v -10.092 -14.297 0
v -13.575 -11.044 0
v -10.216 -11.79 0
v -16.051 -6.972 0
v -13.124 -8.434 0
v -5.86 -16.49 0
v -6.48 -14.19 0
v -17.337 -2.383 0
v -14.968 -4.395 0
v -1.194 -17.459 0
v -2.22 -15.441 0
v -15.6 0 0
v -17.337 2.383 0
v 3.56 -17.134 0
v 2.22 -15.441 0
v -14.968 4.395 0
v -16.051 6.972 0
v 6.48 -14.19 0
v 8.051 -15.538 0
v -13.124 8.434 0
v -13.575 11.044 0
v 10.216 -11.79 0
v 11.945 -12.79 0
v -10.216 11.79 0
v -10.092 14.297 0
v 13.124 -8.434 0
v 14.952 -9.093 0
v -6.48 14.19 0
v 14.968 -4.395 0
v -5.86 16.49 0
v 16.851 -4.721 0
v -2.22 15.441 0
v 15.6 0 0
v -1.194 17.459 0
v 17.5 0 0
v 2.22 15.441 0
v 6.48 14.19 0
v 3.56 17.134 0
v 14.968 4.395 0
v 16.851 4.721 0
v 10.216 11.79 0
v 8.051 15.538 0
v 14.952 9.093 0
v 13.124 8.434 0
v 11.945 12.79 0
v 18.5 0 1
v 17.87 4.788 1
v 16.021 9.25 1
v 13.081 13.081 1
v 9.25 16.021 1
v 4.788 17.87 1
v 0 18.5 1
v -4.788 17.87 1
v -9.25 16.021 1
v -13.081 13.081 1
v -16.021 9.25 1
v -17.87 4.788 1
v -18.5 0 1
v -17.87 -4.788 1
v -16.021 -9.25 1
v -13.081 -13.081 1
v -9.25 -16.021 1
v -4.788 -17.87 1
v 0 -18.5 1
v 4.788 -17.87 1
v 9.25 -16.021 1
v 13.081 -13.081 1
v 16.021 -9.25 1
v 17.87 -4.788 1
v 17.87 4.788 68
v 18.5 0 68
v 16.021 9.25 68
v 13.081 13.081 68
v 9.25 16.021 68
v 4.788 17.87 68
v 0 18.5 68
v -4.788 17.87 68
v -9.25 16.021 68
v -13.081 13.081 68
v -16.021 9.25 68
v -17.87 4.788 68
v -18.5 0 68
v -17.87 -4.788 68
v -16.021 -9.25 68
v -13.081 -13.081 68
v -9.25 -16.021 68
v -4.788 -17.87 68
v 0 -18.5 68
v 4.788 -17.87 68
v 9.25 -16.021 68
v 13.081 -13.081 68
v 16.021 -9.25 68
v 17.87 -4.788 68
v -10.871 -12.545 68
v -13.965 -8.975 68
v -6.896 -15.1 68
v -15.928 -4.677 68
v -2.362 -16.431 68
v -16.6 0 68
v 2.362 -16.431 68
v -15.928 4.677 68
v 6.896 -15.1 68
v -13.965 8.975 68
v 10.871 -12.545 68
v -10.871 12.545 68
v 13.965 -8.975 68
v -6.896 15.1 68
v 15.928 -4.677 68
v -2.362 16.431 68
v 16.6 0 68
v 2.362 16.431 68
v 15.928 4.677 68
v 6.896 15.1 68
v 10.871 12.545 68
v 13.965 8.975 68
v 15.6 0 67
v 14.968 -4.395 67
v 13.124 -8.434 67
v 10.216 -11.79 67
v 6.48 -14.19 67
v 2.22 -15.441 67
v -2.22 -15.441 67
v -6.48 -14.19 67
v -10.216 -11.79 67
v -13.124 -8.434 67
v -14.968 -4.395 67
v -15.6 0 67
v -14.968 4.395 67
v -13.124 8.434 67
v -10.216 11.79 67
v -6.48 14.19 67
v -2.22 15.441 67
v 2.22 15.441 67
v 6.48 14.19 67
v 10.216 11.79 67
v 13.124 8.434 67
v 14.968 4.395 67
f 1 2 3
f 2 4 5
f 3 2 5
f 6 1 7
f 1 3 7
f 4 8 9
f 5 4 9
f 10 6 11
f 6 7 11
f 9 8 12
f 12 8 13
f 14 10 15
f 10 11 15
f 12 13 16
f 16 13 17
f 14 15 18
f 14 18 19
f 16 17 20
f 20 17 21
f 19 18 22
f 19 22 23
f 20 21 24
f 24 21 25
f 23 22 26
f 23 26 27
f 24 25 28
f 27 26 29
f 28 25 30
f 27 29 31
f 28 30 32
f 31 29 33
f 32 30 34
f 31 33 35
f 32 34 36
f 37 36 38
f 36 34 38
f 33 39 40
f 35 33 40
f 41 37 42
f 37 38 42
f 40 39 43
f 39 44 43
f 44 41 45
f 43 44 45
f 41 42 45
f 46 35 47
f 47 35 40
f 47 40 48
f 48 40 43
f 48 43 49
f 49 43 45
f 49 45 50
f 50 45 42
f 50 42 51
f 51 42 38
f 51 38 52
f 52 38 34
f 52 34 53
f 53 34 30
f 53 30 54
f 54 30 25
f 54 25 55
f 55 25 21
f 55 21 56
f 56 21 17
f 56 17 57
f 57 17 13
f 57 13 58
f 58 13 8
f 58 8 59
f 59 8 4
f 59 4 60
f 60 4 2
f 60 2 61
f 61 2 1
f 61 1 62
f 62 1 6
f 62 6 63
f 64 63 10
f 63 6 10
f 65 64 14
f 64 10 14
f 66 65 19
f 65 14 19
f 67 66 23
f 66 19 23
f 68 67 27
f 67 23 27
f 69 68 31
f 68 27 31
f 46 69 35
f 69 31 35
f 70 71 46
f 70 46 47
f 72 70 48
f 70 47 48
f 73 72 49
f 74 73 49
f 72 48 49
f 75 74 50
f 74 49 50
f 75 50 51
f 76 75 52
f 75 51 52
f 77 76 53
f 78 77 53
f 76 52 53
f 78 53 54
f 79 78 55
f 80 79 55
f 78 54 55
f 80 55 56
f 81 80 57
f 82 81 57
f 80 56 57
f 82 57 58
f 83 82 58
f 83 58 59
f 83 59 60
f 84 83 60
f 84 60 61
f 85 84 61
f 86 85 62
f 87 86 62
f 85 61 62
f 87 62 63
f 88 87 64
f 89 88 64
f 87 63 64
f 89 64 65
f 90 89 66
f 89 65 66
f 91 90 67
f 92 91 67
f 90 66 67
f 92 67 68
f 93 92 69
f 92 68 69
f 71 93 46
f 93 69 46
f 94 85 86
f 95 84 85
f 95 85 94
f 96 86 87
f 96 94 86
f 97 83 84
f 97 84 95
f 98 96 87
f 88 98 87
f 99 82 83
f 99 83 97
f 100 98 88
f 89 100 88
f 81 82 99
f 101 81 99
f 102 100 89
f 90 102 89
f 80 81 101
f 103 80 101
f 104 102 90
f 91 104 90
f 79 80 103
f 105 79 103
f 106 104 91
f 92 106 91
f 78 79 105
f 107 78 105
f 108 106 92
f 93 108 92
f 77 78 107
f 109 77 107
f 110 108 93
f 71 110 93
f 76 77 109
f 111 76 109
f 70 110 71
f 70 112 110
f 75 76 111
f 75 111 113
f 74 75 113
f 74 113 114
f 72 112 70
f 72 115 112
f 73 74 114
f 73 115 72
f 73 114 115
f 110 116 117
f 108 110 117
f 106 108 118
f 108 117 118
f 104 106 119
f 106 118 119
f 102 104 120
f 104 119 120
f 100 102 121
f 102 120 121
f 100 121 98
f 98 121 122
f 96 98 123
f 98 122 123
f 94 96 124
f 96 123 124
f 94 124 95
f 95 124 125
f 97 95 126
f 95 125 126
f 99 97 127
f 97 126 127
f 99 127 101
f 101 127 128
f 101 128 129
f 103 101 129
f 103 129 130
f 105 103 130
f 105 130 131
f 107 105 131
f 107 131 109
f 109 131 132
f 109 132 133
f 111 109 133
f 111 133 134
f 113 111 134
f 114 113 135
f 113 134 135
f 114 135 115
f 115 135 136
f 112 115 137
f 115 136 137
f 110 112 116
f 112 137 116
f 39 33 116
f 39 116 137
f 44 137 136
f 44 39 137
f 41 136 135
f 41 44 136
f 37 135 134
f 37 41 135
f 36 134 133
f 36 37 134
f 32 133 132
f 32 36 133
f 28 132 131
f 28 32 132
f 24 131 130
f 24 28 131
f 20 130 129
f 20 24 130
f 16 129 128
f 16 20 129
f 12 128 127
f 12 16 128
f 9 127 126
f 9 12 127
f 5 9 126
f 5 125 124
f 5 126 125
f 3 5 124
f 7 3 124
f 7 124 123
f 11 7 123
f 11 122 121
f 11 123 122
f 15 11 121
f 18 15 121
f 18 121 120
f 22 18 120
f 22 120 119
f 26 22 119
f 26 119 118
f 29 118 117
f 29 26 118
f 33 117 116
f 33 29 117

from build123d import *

# Parameters (mm, degrees)
F0_R     = 18.5
F1_DEPTH = 68
F2_R     = 15.6
F3_DEPTH = 68.001
F4_SIZE  = 1
F5_SIZE  = 1


with BuildPart() as f1:
    # F0 (on Top) → F1 (new body)
    with BuildSketch(Plane.XY):
        Circle(F0_R)
    extrude(amount=F1_DEPTH)

    # F2 (on Top) → F3 (cut, through all)
    with BuildSketch(Plane.XY):
        Circle(F2_R)
    extrude(amount=F3_DEPTH, mode=Mode.SUBTRACT)

    # F4
    f4_edges = [f1.edges().sort_by_distance(p)[0] for p in [
        (-18.5, 0, 0),
    ]]
    chamfer(f4_edges, length=F4_SIZE)

    # F5
    f5_edges = [f1.edges().sort_by_distance(p)[0] for p in [
        (-15.6, 0, 68),
    ]]
    chamfer(f5_edges, length=F5_SIZE)


solid = f1.part
